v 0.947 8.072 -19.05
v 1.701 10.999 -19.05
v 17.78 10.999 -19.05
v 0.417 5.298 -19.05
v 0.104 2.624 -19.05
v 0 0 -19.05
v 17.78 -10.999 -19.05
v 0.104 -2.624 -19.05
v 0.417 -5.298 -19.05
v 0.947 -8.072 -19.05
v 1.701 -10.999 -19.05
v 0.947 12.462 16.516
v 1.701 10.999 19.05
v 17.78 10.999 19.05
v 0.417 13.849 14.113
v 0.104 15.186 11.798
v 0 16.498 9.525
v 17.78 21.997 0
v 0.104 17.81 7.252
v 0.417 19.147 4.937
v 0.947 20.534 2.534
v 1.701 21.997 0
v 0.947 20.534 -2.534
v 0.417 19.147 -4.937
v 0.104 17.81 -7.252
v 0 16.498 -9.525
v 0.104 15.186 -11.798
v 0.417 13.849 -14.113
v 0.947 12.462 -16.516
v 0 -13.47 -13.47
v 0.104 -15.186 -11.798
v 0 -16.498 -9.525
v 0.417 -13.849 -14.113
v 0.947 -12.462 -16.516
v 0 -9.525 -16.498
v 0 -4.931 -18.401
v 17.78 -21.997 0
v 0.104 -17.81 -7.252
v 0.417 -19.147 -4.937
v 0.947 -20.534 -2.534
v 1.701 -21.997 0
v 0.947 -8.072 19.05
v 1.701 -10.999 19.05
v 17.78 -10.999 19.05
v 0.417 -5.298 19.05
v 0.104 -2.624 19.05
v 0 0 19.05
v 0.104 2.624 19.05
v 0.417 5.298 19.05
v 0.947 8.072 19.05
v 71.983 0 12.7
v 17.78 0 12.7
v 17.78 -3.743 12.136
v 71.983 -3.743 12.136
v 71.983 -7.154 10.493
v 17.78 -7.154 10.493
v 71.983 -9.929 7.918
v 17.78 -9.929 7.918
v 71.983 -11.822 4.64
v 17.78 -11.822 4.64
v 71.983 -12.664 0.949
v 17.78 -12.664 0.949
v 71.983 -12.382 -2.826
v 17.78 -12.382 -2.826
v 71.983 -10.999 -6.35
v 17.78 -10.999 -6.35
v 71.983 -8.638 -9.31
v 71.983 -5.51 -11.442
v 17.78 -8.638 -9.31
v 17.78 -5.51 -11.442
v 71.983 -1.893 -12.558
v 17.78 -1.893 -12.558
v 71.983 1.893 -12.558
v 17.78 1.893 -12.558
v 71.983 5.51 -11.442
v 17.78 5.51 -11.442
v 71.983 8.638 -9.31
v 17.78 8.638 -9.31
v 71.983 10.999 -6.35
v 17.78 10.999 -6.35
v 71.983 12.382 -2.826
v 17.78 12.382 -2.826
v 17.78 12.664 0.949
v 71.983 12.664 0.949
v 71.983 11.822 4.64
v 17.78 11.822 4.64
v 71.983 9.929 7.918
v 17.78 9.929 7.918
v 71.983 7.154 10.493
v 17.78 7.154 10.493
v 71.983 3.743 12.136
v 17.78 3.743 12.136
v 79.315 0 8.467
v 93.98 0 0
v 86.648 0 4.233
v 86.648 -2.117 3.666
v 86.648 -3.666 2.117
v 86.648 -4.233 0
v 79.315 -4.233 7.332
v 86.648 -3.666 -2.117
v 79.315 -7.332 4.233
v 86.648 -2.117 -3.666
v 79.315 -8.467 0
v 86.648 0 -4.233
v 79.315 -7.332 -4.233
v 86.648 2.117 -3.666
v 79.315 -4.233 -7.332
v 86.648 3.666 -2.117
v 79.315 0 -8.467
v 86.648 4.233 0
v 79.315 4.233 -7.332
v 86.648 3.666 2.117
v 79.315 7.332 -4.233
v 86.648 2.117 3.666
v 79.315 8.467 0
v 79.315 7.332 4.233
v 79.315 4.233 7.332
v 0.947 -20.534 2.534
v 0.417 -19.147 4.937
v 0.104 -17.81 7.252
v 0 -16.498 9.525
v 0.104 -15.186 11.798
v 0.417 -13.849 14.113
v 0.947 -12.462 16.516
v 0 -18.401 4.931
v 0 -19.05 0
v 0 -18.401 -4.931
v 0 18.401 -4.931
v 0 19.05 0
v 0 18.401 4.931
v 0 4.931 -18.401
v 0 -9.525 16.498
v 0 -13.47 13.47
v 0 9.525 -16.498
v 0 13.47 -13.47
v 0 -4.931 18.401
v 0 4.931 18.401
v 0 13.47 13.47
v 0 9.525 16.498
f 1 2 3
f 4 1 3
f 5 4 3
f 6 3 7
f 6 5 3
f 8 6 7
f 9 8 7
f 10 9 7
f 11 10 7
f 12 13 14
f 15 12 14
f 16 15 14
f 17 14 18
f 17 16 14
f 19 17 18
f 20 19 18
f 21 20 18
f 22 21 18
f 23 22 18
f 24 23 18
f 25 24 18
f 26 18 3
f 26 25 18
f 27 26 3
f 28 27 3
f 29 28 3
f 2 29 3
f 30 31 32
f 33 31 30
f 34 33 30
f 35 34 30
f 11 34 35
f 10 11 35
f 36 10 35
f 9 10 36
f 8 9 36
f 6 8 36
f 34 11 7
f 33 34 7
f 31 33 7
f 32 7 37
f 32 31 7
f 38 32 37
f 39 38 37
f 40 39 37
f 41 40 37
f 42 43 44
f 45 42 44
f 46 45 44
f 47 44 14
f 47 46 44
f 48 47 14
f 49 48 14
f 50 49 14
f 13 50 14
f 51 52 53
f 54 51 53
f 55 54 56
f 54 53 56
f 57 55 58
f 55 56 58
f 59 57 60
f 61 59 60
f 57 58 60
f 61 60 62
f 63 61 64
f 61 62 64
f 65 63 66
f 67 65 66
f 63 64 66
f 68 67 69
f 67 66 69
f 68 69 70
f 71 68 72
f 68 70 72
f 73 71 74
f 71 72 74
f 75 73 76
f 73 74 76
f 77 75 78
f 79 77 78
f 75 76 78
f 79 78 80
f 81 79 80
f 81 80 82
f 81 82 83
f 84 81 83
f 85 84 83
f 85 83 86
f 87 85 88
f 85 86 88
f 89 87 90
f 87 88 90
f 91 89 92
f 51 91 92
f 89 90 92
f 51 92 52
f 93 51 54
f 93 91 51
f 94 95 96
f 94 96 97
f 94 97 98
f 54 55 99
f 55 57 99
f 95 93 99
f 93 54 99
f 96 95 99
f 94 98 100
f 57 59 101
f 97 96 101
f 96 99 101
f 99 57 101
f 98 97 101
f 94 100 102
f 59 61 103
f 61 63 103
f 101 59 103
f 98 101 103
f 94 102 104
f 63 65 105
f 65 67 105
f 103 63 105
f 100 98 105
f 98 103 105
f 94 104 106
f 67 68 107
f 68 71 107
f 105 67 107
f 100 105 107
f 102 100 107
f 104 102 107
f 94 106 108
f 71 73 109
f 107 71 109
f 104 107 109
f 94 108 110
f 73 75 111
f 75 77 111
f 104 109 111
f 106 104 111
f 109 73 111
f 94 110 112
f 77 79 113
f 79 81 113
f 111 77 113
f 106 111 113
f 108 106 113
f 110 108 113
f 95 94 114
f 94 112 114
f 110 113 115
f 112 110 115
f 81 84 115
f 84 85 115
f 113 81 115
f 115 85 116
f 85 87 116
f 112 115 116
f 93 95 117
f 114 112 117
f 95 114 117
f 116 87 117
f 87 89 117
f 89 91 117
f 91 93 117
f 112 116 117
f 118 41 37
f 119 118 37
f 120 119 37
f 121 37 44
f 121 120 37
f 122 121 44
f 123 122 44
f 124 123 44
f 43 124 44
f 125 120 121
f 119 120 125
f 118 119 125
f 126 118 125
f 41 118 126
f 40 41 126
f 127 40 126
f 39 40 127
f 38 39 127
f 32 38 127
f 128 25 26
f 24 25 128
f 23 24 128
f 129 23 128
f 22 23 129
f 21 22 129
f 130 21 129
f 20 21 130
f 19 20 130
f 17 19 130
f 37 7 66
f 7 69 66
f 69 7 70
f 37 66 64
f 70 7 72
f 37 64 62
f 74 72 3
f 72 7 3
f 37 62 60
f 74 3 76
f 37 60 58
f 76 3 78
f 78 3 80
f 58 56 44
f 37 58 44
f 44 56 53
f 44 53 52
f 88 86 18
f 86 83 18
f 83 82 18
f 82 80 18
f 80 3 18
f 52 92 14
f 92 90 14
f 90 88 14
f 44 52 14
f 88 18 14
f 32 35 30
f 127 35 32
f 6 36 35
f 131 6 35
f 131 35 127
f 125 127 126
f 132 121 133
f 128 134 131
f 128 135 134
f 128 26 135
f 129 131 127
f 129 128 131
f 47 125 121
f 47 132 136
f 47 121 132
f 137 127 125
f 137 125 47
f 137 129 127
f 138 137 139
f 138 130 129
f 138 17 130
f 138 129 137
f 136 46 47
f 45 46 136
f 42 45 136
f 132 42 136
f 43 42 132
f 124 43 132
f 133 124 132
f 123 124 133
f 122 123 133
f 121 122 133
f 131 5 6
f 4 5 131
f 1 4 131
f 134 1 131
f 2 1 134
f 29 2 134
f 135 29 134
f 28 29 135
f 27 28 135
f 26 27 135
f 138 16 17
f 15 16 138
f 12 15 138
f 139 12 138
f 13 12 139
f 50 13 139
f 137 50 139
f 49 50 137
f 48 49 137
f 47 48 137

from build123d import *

# Parameters (mm, degrees)
BASEHEAD_DEPTH = 17.78


with BuildPart() as part:
    # Sketch1 → BaseHead (new body)
    with BuildSketch(Plane(origin=(0, 0, 0), x_dir=(0, 0, -1), z_dir=(1, 0, 0))):
        Polygon((19.05, 10.998522628), (19.05, -10.998522628), (0, -21.997045256), (-19.05, -10.998522628), (-19.05, 10.998522628), (0, 21.997045256), align=None)
    extrude(amount=BASEHEAD_DEPTH)

    # Sketch2 → BaseBody (revolve)
    with BuildSketch(Plane.XY, mode=Mode.PRIVATE) as basebody_sk:
        Polygon((0, 0), (93.98, 0), (71.982954744, 12.7), (0, 12.7), align=None)
    revolve(basebody_sk.sketch.rotate(Axis((0, 0, 0), (1, 0, 0)), 90), axis=Axis((0, 0, 0), (1, 0, 0)))

    # Sketch3 → HeadChamfer (revolve, cut)
    with BuildSketch(Plane.XY):
        Polygon((0, 19.05), (5.367651581, 28.347045256), (5.367651581, 34.697045256), (-12.7, 34.697045256), (-12.7, 19.05), align=None)
    revolve(axis=Axis((0, 0, 0), (1, 0, 0)), mode=Mode.SUBTRACT)


solid = part.part
